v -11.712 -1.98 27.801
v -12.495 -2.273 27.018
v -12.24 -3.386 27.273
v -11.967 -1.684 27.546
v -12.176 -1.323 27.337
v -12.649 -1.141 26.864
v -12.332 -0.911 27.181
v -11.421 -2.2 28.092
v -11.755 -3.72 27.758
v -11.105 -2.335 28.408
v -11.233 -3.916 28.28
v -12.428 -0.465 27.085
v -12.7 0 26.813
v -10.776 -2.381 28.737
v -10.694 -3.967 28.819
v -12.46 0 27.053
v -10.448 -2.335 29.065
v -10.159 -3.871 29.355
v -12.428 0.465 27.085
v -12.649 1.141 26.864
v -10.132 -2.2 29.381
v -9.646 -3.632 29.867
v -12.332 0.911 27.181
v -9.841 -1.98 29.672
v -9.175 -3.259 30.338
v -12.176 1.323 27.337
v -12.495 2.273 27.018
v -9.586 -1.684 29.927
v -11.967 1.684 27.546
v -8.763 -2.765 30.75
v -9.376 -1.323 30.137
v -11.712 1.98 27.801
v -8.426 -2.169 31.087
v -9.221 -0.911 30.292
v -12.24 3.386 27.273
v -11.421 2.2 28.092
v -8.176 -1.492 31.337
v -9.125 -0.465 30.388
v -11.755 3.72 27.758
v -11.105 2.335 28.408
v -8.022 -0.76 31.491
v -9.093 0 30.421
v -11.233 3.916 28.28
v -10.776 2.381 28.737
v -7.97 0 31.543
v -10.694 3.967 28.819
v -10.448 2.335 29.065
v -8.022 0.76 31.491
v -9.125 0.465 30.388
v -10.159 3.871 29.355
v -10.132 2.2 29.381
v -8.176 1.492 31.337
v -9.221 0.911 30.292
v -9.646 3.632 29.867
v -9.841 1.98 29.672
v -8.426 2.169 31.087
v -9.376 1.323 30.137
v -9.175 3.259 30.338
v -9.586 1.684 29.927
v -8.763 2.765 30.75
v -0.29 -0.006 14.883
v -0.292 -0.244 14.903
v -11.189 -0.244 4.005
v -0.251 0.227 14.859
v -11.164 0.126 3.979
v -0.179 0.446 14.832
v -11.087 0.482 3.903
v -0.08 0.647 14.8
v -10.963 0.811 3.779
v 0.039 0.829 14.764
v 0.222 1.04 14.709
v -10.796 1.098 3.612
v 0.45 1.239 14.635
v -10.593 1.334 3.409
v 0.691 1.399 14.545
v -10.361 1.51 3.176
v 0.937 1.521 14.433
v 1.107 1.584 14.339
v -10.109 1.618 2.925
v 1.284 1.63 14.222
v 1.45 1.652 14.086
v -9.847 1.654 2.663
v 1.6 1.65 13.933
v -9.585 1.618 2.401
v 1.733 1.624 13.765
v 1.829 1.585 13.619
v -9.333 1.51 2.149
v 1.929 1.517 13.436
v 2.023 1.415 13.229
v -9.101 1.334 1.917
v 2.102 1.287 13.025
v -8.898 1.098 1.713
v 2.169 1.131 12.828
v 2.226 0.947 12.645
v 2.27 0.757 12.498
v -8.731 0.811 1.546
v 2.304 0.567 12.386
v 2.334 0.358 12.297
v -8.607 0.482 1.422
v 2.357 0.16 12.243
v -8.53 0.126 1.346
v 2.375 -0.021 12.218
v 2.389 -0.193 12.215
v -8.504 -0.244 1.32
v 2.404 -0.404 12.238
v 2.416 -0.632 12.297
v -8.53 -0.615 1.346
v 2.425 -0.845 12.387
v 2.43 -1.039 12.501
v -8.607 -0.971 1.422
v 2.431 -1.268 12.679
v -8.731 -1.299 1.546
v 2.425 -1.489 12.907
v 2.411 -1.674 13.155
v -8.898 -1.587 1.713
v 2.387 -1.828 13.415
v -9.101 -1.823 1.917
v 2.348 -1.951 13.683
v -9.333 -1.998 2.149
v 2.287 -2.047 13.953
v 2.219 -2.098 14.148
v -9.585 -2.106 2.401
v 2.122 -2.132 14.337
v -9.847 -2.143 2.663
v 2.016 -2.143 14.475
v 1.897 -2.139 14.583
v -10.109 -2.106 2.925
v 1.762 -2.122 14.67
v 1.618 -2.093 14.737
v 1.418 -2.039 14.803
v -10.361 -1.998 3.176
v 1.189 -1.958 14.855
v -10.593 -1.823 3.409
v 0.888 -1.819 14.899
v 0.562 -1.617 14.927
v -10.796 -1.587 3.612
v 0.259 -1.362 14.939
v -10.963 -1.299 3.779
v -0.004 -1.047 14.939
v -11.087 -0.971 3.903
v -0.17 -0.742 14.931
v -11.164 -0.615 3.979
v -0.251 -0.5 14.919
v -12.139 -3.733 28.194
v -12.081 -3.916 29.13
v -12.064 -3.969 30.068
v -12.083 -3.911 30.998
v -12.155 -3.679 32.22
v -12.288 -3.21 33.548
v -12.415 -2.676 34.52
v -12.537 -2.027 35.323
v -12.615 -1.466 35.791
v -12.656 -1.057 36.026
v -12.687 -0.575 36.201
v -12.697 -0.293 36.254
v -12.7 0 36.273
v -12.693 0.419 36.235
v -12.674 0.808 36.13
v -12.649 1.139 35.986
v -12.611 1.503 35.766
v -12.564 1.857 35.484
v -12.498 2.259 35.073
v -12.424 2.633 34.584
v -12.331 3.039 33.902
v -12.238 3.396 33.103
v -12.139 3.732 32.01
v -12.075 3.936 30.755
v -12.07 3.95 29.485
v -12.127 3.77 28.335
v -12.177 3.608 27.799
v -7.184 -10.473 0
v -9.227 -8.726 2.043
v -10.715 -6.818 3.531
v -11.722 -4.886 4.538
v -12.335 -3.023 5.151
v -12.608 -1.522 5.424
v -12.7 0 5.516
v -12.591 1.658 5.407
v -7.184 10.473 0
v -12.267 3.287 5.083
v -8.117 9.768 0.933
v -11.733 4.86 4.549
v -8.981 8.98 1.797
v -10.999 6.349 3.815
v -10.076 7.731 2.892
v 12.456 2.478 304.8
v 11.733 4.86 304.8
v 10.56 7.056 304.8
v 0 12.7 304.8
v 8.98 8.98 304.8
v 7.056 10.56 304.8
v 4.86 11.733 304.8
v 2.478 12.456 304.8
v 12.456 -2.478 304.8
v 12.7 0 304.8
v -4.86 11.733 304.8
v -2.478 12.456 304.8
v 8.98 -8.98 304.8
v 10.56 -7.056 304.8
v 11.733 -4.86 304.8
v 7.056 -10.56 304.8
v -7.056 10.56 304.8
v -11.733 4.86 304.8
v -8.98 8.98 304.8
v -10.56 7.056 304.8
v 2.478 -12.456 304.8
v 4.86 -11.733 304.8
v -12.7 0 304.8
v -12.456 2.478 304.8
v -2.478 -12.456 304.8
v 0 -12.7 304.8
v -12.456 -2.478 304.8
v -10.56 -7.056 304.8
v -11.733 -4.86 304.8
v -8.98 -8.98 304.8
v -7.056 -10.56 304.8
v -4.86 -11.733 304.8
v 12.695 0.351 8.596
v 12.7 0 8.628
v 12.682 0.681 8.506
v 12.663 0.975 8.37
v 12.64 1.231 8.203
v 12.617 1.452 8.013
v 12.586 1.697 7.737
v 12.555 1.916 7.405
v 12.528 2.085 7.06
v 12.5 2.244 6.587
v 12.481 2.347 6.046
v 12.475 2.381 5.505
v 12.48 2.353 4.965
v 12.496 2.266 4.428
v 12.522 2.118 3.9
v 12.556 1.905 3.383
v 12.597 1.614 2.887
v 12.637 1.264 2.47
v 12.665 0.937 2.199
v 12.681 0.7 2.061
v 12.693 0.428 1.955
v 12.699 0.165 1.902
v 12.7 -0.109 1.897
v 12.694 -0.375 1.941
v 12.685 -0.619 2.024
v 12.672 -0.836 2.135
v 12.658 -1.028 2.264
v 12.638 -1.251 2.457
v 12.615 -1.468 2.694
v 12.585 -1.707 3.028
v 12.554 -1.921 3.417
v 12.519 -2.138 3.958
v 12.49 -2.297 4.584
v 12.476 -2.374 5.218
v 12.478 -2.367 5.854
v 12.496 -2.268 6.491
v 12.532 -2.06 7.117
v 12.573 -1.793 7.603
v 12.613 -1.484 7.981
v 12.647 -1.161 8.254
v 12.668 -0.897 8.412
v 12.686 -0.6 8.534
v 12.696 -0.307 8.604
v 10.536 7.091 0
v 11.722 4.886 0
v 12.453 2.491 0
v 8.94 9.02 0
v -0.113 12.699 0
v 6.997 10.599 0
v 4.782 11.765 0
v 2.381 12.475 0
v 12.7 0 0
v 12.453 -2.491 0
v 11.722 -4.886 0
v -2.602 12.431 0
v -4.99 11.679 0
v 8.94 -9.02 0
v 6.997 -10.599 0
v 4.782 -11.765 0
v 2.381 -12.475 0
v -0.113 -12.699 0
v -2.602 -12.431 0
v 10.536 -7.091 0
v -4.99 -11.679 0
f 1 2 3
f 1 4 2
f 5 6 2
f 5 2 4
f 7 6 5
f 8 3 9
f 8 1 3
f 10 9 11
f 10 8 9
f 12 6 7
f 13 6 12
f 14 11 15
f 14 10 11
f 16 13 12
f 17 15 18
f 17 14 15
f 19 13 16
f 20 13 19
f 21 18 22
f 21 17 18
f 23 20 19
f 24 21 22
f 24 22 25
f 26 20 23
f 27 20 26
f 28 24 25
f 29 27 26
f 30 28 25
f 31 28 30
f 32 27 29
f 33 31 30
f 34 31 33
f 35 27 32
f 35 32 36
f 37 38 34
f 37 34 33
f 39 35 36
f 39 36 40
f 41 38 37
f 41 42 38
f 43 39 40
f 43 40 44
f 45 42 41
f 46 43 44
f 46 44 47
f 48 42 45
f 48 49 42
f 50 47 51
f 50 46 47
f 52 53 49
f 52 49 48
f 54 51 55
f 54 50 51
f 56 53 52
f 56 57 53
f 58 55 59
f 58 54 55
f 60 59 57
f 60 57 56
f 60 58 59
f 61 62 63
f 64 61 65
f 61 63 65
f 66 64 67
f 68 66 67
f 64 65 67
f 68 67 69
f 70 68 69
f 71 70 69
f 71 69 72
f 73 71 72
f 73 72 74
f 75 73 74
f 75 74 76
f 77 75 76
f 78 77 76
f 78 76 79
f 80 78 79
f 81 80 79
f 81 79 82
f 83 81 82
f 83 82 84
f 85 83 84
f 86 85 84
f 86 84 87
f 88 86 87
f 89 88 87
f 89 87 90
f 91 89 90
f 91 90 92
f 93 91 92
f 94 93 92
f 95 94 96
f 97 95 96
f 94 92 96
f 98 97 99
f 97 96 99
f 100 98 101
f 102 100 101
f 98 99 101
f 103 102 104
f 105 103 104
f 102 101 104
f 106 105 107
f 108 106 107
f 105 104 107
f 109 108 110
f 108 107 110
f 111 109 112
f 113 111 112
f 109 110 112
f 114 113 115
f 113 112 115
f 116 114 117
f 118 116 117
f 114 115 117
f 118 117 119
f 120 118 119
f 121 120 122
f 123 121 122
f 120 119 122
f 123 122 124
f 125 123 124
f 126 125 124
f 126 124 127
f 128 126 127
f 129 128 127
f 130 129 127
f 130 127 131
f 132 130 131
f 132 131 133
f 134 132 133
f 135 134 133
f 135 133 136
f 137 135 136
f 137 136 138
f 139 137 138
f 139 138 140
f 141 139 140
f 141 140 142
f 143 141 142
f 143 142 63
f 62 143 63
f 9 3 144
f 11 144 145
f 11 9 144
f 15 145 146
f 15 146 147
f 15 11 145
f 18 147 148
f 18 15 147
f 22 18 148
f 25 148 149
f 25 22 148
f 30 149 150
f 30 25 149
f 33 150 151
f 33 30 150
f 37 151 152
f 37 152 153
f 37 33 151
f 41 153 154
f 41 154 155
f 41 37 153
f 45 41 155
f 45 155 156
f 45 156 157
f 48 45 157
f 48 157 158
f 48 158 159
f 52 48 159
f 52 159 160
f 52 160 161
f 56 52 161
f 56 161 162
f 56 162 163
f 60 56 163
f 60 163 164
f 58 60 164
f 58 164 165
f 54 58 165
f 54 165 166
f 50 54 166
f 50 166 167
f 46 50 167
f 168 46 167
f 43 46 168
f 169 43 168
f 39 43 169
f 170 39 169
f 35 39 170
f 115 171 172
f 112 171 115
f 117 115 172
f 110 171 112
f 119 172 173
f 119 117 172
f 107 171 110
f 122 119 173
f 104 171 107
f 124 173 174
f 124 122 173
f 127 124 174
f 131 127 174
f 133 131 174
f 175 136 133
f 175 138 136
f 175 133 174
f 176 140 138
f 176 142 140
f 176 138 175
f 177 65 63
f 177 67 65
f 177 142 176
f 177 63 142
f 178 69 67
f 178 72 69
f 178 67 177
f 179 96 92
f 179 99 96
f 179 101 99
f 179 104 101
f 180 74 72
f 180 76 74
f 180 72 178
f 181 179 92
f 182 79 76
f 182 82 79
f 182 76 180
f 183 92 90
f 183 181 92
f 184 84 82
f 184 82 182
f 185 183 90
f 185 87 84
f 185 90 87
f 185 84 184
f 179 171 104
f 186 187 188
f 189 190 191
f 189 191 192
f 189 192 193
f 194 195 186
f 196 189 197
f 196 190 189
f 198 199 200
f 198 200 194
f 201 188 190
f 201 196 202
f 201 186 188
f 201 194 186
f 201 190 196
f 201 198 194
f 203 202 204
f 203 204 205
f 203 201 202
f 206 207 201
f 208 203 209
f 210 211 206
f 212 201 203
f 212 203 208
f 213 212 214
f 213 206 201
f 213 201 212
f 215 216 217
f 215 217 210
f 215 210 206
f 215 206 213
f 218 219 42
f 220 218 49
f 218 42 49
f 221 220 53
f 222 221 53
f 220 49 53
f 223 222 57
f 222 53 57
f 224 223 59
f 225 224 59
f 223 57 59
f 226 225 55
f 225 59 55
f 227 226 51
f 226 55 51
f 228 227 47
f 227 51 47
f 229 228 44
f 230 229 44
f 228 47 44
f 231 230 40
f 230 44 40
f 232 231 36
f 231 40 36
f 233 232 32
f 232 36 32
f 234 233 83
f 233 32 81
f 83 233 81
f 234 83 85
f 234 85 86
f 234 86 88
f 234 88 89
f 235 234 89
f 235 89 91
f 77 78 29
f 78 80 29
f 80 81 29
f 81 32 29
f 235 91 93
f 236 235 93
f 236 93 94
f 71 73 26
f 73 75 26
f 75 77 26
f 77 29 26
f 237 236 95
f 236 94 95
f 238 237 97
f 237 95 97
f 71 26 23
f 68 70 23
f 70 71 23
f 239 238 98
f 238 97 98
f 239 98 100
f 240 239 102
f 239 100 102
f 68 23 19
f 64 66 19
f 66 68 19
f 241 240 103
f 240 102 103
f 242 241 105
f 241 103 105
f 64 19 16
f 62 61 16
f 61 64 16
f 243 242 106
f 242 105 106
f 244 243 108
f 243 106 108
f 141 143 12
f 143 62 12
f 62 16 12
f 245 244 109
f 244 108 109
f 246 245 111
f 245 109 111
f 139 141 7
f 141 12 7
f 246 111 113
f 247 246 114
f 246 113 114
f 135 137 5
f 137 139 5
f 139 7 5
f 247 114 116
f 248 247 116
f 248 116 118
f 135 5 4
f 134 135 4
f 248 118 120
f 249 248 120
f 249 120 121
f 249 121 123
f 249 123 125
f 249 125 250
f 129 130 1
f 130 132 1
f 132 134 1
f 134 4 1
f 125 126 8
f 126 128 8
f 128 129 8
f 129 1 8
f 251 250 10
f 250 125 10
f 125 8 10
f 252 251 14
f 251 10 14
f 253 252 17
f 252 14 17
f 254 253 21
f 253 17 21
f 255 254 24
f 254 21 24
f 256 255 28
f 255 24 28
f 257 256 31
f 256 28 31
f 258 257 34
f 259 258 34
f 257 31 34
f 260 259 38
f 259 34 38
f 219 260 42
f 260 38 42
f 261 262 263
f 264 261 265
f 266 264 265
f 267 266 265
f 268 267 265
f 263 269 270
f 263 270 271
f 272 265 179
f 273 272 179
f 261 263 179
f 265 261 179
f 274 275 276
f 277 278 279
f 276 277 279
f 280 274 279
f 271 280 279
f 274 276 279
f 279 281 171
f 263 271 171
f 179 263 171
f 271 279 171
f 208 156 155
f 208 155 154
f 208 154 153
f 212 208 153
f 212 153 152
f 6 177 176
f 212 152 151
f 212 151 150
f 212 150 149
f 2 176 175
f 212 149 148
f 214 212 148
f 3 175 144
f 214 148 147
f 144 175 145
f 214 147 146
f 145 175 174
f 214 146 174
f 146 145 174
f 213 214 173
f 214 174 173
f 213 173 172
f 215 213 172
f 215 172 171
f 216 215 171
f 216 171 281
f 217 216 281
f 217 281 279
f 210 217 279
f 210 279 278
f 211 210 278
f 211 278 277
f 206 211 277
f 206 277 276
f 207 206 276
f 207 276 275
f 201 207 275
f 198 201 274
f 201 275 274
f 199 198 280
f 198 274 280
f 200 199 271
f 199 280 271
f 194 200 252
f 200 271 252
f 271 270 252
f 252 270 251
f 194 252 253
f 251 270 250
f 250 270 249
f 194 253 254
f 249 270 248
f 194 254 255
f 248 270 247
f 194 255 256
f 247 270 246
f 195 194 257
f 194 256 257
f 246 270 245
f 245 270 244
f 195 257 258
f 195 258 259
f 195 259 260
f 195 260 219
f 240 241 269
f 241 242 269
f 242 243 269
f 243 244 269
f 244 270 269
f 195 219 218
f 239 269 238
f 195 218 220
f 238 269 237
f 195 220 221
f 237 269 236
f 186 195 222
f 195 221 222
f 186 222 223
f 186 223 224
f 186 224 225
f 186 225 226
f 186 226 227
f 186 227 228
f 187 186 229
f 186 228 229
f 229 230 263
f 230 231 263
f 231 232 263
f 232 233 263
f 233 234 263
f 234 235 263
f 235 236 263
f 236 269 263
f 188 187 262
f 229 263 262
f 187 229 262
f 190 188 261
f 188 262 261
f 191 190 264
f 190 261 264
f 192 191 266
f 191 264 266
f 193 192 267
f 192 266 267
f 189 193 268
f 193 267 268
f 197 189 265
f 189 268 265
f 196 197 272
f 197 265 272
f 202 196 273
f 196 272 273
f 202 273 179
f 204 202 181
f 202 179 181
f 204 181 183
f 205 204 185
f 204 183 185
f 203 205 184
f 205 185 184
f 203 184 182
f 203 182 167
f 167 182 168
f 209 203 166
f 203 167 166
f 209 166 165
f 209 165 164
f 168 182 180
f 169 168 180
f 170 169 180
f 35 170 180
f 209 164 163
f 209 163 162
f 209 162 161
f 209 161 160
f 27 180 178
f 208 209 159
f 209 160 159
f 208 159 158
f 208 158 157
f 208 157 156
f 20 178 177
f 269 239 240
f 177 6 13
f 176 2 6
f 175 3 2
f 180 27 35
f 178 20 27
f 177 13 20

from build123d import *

# Parameters (mm, degrees)
SKETCH1_R                   = 12.7
EXTRUDE1_DEPTH              = 304.8
SKETCH4_R                   = 2.38125
EXTRUDE2_DEPTH              = 306.328708116
EXTRUDE2_DEPTH_BACK         = 306.328708116
SKETCH6_W                   = 20.167016722
SKETCH6_H                   = 37.330359398
EXTRUDE3_DEPTH              = 63.5
F_10_24_TAPPED_HOLE1_REACH  = 305.254
F_10_24_TAPPED_HOLE1_BORE_R = 1.89865
SKETCH10_R                  = 3.96875
EXTRUDE4_DEPTH              = 288.166292049


with BuildPart() as part:
    # Sketch1 → Extrude1 (new body)
    with BuildSketch(Plane.XY):
        with Locations(Location((0, 0, 0), (0, 0, 180))):
            Circle(SKETCH1_R)
    extrude(amount=EXTRUDE1_DEPTH)

    # Sketch4 → Extrude2 (cut, two sides)
    with BuildSketch(Plane(origin=(0, 0, 0), x_dir=(0.7071067811865462, 0, 0.7071067811865488), z_dir=(-0.7071067811865488, 0, 0.7071067811865462))) as extrude2_sk:
        with Locations((12.7, 0)):
            Circle(SKETCH4_R)
    extrude(amount=EXTRUDE2_DEPTH, mode=Mode.SUBTRACT)
    extrude(extrude2_sk.sketch, amount=-EXTRUDE2_DEPTH_BACK, mode=Mode.SUBTRACT)

    # Sketch6 → Extrude3 (cut)
    with BuildSketch(Plane(origin=(-3.592102448, 0, -3.592102448), x_dir=(-0.7071067811865512, 0, 0.7071067811865438), z_dir=(-0.7071067811865438, 0, -0.7071067811865512))):
        with Locations((5.167476491, 0)):
            Rectangle(SKETCH6_W, SKETCH6_H)
    extrude(amount=EXTRUDE3_DEPTH, mode=Mode.SUBTRACT)

    # #10-24 Tapped Hole1 bore (on position points) → #10-24 Tapped Hole1 (cut, up to next)
    with BuildSketch(Plane(origin=(-9.846920352, -0.244294465, 2.662715455), x_dir=(-0.707106781187, 0, 0.707106781187), z_dir=(-0.707106781187, 0, -0.707106781187)), mode=Mode.PRIVATE) as f_10_24_tapped_hole1_sk1:
        Circle(F_10_24_TAPPED_HOLE1_BORE_R)
    f_10_24_tapped_hole1_tool1 = extrude(f_10_24_tapped_hole1_sk1.sketch, amount=-F_10_24_TAPPED_HOLE1_REACH, mode=Mode.PRIVATE) & part.part
    add(f_10_24_tapped_hole1_tool1.solids().sort_by_distance((-9.84692, -0.244294, 2.662715))[0], mode=Mode.SUBTRACT)

    # Sketch10 → Extrude4 (cut, through all)
    with BuildSketch(Plane(origin=(-19.756563466, 0, 19.756563466), x_dir=(0.7071067811865462, 0, 0.7071067811865488), z_dir=(-0.7071067811865488, 0, 0.7071067811865462))):
        with Locations((12.7, 0)):
            Circle(SKETCH10_R)
    extrude(amount=EXTRUDE4_DEPTH, mode=Mode.SUBTRACT)


solid = part.part
